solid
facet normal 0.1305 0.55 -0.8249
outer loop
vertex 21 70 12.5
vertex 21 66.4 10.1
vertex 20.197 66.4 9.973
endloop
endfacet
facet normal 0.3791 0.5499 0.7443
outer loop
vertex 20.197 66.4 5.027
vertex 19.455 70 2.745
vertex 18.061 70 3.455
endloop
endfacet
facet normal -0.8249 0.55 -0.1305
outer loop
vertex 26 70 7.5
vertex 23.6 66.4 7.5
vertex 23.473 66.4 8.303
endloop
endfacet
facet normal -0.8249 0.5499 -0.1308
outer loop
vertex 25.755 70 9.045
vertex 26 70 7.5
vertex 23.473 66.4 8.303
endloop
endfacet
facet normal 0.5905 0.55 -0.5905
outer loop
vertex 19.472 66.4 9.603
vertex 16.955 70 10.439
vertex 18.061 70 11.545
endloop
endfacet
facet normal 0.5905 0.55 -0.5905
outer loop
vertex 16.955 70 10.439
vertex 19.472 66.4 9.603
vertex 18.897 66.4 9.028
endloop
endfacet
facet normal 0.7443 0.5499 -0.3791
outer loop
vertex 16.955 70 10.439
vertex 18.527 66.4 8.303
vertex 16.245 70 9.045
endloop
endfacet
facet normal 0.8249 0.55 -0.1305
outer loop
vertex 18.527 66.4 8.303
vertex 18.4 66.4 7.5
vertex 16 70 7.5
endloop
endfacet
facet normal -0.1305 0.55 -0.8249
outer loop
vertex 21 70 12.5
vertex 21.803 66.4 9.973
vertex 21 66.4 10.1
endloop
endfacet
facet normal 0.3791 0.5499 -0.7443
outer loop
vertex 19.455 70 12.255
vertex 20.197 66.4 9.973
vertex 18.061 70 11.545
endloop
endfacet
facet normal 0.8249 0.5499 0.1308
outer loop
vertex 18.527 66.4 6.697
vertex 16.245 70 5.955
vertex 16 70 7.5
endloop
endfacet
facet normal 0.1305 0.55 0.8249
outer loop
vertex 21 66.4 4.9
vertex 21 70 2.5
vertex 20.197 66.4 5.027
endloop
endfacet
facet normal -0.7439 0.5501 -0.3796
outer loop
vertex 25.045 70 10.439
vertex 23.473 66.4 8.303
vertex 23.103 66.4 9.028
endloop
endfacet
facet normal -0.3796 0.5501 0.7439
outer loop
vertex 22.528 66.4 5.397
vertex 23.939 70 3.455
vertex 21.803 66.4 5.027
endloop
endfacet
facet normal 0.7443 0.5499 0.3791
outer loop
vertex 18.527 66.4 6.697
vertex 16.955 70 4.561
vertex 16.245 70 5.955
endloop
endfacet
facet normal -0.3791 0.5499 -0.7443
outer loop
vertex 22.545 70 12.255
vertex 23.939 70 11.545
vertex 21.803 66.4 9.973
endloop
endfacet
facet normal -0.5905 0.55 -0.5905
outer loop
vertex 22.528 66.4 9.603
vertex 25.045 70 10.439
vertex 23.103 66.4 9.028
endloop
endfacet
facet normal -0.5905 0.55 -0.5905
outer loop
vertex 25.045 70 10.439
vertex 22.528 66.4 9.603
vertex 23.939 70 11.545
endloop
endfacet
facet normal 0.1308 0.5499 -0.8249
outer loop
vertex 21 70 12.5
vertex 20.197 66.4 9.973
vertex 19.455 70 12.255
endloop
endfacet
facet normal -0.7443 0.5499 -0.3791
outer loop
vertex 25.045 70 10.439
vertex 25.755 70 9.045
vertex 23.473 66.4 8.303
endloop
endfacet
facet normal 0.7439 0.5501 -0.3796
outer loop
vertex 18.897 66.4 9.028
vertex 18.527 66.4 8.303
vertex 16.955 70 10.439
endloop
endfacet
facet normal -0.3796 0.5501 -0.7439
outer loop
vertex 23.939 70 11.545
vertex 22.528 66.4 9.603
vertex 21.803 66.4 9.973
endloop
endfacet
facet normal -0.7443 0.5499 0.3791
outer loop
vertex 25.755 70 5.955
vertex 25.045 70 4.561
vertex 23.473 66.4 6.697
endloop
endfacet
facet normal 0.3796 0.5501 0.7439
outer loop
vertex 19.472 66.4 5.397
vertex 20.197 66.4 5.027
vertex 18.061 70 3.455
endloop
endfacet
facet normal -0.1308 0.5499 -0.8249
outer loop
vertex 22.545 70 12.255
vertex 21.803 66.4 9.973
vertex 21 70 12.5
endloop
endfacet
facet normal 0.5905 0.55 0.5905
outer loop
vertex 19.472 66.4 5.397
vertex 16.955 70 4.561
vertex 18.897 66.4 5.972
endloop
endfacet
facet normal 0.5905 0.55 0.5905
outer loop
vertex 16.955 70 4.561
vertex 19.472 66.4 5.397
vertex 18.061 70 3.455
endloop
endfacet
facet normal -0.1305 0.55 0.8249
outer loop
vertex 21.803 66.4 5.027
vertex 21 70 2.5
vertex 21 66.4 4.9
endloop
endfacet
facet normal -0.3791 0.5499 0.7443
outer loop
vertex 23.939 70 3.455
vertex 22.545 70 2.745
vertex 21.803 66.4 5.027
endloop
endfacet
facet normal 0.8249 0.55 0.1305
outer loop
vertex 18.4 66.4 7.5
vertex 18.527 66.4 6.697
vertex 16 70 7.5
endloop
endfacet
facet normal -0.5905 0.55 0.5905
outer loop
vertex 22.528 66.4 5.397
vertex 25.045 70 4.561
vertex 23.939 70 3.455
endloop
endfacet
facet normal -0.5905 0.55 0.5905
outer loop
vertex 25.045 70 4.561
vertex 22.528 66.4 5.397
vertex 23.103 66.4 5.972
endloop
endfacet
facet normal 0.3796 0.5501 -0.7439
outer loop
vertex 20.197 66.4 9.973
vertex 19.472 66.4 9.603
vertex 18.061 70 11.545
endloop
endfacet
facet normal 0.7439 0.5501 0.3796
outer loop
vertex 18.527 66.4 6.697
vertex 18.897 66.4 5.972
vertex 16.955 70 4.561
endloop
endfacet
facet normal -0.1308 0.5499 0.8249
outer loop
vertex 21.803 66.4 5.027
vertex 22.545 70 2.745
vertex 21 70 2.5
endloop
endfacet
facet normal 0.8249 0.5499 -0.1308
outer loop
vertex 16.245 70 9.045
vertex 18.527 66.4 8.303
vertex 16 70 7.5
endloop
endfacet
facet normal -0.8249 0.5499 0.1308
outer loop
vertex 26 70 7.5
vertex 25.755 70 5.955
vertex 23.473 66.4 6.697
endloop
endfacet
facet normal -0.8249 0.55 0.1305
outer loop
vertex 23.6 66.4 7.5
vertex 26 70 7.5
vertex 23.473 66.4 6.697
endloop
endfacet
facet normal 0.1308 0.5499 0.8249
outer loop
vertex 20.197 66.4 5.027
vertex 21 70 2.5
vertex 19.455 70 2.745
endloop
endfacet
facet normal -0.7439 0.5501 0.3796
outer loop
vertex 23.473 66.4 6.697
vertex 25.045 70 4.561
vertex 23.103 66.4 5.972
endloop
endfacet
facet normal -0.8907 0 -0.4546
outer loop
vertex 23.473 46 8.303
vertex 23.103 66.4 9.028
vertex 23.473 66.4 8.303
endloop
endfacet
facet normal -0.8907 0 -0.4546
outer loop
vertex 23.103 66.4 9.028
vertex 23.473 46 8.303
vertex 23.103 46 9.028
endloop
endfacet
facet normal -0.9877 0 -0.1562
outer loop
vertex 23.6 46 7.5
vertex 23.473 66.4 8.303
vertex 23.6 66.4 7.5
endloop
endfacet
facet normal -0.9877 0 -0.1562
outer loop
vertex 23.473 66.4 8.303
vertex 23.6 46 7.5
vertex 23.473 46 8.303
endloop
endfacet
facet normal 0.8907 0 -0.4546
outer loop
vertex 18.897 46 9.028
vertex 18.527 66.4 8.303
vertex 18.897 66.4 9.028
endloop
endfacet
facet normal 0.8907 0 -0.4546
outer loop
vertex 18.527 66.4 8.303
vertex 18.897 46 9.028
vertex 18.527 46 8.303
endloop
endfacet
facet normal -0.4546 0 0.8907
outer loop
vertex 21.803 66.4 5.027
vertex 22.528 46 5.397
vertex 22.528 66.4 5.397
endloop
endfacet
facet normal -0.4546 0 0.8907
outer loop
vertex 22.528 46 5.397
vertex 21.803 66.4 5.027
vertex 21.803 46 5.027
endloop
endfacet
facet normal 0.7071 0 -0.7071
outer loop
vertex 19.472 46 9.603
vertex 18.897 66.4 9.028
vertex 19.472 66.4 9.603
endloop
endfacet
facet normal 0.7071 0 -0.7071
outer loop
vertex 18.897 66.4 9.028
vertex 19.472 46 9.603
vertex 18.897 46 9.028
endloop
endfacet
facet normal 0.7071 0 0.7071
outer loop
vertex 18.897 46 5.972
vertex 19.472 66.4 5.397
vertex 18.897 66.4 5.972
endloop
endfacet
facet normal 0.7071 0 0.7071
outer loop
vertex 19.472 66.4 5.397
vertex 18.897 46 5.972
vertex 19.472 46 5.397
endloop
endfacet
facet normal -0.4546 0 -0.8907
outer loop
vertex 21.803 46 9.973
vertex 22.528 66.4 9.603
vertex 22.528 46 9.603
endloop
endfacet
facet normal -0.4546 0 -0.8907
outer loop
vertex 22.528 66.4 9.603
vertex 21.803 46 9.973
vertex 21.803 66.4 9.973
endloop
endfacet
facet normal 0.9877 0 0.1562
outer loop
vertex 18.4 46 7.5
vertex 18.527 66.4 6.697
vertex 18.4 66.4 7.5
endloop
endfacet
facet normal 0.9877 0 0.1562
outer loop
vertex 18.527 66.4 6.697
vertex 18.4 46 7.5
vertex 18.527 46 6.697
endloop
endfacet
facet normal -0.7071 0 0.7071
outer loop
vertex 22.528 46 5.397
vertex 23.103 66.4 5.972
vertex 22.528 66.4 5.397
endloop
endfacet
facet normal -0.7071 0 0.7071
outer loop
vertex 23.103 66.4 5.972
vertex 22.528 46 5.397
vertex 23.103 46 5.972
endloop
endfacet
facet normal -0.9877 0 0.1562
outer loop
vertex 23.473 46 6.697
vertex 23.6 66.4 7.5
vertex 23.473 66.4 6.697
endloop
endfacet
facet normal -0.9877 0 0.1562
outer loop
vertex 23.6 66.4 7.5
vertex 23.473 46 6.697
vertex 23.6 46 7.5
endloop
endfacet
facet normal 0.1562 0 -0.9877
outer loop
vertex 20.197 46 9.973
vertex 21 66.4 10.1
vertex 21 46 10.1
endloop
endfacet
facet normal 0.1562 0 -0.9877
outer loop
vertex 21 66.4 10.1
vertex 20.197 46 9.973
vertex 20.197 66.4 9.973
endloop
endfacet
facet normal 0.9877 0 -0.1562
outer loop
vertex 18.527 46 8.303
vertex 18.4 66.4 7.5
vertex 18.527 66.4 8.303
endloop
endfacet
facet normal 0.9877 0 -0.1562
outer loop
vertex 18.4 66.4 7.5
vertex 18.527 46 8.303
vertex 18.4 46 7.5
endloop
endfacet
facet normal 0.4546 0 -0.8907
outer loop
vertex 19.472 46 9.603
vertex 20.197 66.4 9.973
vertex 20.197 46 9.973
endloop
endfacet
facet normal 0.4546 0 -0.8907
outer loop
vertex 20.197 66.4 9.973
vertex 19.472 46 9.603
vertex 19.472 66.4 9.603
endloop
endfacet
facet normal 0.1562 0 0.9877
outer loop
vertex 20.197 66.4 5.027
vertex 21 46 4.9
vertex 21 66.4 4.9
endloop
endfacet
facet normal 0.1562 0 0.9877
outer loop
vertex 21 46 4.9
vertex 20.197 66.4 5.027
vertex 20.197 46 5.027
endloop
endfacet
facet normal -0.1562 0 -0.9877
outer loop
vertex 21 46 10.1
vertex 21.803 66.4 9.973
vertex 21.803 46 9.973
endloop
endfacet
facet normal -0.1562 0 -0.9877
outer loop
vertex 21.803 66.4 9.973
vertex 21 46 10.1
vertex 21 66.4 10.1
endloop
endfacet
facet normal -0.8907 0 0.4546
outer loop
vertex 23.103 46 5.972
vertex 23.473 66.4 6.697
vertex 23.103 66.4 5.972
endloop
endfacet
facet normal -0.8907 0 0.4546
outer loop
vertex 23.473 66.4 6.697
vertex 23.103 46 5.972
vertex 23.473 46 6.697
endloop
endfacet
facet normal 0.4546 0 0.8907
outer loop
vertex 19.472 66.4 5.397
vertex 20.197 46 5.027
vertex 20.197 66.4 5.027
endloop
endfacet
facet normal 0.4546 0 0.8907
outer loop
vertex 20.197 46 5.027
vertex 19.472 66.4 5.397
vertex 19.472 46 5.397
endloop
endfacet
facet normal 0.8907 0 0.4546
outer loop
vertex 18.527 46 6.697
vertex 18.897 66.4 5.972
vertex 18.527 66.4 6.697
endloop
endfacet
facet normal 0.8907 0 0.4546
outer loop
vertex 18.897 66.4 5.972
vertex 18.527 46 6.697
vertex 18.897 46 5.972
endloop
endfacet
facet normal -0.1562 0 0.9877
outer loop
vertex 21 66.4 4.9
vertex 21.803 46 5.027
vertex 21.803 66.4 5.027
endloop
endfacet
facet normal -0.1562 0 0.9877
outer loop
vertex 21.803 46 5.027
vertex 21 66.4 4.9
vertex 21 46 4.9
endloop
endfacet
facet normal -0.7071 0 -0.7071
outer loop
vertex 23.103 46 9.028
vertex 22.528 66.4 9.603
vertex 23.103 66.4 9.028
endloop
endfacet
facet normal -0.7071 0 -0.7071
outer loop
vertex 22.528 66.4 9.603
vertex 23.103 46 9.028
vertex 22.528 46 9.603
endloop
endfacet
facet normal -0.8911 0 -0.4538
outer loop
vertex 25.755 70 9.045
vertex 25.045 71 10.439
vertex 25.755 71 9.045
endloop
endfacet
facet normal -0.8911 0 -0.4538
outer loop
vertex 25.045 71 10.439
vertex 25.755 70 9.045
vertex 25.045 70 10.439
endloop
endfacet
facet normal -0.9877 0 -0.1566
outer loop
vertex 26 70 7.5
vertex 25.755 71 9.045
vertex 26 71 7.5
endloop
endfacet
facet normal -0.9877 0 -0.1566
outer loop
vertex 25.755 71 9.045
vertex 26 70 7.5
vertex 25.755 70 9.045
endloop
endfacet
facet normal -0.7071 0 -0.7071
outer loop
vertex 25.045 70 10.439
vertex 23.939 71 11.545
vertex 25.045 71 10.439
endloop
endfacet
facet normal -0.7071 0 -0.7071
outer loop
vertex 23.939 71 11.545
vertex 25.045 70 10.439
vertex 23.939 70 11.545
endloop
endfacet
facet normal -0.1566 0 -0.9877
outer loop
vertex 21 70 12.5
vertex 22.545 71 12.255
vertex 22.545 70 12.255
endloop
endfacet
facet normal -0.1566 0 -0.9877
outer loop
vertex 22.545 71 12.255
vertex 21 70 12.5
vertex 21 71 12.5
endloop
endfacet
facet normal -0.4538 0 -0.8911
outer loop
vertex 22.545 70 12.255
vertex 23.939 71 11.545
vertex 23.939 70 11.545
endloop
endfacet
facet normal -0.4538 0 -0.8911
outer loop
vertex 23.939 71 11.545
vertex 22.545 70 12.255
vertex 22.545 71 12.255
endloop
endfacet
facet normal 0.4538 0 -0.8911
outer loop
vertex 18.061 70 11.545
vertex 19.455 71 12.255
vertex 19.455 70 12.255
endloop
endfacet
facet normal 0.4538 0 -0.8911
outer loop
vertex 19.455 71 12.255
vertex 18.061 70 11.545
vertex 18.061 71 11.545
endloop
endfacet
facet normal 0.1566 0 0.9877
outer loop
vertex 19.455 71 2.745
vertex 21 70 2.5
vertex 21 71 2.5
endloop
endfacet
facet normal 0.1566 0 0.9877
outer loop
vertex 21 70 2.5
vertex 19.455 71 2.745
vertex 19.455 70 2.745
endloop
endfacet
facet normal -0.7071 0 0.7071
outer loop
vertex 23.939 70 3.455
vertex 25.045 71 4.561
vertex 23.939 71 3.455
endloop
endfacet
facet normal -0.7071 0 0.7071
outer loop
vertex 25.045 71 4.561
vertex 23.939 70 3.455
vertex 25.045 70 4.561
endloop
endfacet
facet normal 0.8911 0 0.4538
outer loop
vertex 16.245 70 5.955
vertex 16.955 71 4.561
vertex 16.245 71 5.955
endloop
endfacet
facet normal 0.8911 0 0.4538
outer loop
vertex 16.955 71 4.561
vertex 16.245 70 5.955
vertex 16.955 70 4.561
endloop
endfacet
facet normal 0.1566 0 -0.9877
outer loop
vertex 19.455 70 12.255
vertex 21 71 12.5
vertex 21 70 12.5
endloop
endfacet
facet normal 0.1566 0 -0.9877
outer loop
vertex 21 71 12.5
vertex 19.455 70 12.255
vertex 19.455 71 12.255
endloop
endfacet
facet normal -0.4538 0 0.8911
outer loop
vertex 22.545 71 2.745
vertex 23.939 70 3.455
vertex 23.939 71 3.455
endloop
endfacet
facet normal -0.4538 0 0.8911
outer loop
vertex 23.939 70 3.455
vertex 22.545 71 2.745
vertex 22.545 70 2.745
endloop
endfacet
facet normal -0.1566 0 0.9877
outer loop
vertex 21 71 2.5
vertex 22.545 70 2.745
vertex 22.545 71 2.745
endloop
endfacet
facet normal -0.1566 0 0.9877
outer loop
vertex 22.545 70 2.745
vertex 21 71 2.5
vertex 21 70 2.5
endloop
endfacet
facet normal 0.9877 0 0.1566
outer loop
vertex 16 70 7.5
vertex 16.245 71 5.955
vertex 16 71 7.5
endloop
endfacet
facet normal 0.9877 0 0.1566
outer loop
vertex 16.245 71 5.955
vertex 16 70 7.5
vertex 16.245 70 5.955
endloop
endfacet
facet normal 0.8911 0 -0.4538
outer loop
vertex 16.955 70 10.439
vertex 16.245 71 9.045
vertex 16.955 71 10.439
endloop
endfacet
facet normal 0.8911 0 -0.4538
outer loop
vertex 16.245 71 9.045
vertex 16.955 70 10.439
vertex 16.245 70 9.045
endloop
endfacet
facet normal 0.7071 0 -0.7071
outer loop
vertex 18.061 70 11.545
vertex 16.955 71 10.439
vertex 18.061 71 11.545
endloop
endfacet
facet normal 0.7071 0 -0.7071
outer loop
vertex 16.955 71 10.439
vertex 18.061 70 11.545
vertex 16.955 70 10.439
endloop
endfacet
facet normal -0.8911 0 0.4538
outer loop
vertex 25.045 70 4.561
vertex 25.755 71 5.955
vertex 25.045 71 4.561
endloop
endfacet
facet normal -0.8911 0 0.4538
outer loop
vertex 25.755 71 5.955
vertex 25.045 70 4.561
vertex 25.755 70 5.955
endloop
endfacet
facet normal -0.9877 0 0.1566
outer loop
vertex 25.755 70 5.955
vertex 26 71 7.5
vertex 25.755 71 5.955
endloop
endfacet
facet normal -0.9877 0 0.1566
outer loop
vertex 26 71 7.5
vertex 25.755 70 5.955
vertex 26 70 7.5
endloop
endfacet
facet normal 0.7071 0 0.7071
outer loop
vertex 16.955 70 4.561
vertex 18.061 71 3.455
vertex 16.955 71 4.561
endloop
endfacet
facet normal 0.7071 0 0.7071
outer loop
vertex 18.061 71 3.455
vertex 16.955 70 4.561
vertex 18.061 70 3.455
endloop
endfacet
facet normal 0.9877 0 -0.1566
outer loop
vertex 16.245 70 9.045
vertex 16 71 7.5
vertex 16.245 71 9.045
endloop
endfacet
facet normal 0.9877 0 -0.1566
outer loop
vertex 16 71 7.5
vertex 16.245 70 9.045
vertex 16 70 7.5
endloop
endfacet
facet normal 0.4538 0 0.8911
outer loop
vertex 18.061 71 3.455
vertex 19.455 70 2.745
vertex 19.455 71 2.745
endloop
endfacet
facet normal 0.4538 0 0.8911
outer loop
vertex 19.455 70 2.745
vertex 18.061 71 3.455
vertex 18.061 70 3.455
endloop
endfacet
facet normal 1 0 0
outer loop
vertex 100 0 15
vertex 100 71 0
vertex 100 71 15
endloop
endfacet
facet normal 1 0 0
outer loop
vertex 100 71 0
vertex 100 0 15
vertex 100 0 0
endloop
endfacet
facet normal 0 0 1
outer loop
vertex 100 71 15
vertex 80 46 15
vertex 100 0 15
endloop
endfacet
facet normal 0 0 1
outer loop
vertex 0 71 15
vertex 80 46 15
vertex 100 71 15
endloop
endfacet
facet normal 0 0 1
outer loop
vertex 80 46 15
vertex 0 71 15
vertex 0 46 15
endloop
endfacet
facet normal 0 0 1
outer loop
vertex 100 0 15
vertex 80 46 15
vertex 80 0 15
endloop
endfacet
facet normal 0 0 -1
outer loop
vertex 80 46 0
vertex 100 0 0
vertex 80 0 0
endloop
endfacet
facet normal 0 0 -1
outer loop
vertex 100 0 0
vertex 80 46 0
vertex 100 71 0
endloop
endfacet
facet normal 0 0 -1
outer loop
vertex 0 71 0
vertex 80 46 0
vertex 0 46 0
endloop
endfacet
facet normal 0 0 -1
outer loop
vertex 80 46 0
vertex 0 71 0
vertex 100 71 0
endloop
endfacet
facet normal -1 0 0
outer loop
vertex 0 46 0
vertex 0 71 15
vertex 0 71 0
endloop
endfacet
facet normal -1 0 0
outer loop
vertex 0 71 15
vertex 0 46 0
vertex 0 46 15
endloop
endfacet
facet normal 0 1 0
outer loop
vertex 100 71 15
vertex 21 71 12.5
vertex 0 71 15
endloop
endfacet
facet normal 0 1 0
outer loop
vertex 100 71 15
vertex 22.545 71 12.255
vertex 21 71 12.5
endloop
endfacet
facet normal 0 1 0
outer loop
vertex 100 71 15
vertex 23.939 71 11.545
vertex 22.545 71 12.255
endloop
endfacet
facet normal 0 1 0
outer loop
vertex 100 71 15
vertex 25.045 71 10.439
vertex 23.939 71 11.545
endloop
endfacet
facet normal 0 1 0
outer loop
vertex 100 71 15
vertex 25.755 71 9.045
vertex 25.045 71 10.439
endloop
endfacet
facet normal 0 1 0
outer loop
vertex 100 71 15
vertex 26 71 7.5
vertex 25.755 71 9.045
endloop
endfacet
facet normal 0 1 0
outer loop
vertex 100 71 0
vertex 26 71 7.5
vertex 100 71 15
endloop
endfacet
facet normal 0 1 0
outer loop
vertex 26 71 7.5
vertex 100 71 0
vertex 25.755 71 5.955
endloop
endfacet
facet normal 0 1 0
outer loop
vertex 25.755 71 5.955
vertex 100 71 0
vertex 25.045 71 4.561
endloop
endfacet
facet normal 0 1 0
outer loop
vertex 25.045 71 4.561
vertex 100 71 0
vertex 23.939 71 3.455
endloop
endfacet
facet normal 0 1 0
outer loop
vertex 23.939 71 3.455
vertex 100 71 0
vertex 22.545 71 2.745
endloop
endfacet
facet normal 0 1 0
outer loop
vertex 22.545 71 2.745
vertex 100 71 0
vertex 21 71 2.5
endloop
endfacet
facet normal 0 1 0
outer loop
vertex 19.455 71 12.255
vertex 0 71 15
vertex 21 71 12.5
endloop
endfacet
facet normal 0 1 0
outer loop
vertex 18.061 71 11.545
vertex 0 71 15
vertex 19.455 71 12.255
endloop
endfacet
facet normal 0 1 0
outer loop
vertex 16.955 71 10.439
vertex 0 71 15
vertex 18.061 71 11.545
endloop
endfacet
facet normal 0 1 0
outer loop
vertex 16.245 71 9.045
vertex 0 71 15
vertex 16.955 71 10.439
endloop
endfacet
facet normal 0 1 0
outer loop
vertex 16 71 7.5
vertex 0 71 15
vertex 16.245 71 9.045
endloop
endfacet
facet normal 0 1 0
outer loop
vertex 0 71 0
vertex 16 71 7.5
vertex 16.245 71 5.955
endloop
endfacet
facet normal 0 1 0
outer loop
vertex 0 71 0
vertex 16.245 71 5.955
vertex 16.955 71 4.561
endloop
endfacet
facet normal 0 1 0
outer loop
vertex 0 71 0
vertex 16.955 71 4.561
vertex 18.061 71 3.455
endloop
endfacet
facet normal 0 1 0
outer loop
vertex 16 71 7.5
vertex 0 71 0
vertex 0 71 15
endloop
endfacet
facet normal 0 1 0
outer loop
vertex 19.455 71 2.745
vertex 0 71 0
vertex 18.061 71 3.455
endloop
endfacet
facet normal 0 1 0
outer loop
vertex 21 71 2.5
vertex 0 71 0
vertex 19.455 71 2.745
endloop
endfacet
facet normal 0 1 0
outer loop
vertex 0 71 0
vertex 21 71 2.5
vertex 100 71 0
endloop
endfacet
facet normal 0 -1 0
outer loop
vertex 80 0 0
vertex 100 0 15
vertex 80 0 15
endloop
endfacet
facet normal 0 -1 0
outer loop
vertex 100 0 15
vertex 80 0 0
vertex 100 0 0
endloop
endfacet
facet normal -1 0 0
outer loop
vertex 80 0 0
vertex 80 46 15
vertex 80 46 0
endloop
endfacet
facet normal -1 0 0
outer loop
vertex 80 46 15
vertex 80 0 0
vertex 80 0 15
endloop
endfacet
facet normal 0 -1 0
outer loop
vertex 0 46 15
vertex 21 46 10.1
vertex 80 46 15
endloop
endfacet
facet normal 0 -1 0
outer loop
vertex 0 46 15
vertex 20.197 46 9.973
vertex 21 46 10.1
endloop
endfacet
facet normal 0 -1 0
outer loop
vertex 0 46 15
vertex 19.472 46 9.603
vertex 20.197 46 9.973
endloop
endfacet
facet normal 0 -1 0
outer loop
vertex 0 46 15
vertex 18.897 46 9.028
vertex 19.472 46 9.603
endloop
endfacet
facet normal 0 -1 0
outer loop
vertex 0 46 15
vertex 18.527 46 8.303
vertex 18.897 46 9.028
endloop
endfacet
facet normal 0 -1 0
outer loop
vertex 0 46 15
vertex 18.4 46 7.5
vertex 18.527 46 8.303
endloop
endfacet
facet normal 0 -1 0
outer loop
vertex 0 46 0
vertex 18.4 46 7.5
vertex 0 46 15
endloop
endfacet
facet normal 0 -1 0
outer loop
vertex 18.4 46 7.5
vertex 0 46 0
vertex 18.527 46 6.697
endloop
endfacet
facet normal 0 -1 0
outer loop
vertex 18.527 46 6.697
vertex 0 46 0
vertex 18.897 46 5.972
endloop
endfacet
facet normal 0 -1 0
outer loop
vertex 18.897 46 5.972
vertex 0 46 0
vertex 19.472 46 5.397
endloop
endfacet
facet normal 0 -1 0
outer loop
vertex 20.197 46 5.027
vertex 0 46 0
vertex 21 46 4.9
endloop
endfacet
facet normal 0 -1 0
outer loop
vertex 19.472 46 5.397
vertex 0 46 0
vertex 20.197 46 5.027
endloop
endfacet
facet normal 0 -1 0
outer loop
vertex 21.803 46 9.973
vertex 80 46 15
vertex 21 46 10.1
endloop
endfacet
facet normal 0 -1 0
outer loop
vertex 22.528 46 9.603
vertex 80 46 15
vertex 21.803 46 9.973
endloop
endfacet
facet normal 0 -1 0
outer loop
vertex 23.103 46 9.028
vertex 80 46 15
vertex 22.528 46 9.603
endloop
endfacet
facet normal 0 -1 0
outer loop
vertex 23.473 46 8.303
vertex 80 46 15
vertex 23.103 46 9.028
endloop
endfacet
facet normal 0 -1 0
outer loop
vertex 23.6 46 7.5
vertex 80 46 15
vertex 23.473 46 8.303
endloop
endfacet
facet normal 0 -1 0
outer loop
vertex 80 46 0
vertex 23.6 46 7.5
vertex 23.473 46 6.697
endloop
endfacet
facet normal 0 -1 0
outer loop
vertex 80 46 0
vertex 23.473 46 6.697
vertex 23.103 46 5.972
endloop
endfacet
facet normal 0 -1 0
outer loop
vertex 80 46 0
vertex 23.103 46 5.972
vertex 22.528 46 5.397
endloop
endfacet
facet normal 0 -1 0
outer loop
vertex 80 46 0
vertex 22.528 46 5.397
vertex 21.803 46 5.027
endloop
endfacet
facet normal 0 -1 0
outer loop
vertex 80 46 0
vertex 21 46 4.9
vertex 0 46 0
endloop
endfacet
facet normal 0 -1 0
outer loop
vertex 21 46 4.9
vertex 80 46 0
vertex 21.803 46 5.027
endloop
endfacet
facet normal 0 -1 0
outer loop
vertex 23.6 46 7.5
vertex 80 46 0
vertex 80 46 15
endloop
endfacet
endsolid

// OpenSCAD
a = 80;
b = 46;
e = 100;
d = 71;

width = 15;

screw_offset = 21;
module screw_countersunk(
        l=30,   //length
        dh = 10,   //head dia
        lh = 3.6,   //head length
        ds = 5.2,  //shaft dia
        rec = 2,
        $fn=20,
        )
{
        translate([0, 0, rec]) {
          cylinder(h=lh, r1=dh/2, r2=ds/2);
          cylinder(h=l, d=ds);
        }
        cylinder(h=rec, d=dh);
}


difference() {
    cube([e,d,width]);
    cube([a,b,width]);
    
translate([screw_offset, d+1, 0.5*width]) rotate ([90, 0, 0]) screw_countersunk();
}
